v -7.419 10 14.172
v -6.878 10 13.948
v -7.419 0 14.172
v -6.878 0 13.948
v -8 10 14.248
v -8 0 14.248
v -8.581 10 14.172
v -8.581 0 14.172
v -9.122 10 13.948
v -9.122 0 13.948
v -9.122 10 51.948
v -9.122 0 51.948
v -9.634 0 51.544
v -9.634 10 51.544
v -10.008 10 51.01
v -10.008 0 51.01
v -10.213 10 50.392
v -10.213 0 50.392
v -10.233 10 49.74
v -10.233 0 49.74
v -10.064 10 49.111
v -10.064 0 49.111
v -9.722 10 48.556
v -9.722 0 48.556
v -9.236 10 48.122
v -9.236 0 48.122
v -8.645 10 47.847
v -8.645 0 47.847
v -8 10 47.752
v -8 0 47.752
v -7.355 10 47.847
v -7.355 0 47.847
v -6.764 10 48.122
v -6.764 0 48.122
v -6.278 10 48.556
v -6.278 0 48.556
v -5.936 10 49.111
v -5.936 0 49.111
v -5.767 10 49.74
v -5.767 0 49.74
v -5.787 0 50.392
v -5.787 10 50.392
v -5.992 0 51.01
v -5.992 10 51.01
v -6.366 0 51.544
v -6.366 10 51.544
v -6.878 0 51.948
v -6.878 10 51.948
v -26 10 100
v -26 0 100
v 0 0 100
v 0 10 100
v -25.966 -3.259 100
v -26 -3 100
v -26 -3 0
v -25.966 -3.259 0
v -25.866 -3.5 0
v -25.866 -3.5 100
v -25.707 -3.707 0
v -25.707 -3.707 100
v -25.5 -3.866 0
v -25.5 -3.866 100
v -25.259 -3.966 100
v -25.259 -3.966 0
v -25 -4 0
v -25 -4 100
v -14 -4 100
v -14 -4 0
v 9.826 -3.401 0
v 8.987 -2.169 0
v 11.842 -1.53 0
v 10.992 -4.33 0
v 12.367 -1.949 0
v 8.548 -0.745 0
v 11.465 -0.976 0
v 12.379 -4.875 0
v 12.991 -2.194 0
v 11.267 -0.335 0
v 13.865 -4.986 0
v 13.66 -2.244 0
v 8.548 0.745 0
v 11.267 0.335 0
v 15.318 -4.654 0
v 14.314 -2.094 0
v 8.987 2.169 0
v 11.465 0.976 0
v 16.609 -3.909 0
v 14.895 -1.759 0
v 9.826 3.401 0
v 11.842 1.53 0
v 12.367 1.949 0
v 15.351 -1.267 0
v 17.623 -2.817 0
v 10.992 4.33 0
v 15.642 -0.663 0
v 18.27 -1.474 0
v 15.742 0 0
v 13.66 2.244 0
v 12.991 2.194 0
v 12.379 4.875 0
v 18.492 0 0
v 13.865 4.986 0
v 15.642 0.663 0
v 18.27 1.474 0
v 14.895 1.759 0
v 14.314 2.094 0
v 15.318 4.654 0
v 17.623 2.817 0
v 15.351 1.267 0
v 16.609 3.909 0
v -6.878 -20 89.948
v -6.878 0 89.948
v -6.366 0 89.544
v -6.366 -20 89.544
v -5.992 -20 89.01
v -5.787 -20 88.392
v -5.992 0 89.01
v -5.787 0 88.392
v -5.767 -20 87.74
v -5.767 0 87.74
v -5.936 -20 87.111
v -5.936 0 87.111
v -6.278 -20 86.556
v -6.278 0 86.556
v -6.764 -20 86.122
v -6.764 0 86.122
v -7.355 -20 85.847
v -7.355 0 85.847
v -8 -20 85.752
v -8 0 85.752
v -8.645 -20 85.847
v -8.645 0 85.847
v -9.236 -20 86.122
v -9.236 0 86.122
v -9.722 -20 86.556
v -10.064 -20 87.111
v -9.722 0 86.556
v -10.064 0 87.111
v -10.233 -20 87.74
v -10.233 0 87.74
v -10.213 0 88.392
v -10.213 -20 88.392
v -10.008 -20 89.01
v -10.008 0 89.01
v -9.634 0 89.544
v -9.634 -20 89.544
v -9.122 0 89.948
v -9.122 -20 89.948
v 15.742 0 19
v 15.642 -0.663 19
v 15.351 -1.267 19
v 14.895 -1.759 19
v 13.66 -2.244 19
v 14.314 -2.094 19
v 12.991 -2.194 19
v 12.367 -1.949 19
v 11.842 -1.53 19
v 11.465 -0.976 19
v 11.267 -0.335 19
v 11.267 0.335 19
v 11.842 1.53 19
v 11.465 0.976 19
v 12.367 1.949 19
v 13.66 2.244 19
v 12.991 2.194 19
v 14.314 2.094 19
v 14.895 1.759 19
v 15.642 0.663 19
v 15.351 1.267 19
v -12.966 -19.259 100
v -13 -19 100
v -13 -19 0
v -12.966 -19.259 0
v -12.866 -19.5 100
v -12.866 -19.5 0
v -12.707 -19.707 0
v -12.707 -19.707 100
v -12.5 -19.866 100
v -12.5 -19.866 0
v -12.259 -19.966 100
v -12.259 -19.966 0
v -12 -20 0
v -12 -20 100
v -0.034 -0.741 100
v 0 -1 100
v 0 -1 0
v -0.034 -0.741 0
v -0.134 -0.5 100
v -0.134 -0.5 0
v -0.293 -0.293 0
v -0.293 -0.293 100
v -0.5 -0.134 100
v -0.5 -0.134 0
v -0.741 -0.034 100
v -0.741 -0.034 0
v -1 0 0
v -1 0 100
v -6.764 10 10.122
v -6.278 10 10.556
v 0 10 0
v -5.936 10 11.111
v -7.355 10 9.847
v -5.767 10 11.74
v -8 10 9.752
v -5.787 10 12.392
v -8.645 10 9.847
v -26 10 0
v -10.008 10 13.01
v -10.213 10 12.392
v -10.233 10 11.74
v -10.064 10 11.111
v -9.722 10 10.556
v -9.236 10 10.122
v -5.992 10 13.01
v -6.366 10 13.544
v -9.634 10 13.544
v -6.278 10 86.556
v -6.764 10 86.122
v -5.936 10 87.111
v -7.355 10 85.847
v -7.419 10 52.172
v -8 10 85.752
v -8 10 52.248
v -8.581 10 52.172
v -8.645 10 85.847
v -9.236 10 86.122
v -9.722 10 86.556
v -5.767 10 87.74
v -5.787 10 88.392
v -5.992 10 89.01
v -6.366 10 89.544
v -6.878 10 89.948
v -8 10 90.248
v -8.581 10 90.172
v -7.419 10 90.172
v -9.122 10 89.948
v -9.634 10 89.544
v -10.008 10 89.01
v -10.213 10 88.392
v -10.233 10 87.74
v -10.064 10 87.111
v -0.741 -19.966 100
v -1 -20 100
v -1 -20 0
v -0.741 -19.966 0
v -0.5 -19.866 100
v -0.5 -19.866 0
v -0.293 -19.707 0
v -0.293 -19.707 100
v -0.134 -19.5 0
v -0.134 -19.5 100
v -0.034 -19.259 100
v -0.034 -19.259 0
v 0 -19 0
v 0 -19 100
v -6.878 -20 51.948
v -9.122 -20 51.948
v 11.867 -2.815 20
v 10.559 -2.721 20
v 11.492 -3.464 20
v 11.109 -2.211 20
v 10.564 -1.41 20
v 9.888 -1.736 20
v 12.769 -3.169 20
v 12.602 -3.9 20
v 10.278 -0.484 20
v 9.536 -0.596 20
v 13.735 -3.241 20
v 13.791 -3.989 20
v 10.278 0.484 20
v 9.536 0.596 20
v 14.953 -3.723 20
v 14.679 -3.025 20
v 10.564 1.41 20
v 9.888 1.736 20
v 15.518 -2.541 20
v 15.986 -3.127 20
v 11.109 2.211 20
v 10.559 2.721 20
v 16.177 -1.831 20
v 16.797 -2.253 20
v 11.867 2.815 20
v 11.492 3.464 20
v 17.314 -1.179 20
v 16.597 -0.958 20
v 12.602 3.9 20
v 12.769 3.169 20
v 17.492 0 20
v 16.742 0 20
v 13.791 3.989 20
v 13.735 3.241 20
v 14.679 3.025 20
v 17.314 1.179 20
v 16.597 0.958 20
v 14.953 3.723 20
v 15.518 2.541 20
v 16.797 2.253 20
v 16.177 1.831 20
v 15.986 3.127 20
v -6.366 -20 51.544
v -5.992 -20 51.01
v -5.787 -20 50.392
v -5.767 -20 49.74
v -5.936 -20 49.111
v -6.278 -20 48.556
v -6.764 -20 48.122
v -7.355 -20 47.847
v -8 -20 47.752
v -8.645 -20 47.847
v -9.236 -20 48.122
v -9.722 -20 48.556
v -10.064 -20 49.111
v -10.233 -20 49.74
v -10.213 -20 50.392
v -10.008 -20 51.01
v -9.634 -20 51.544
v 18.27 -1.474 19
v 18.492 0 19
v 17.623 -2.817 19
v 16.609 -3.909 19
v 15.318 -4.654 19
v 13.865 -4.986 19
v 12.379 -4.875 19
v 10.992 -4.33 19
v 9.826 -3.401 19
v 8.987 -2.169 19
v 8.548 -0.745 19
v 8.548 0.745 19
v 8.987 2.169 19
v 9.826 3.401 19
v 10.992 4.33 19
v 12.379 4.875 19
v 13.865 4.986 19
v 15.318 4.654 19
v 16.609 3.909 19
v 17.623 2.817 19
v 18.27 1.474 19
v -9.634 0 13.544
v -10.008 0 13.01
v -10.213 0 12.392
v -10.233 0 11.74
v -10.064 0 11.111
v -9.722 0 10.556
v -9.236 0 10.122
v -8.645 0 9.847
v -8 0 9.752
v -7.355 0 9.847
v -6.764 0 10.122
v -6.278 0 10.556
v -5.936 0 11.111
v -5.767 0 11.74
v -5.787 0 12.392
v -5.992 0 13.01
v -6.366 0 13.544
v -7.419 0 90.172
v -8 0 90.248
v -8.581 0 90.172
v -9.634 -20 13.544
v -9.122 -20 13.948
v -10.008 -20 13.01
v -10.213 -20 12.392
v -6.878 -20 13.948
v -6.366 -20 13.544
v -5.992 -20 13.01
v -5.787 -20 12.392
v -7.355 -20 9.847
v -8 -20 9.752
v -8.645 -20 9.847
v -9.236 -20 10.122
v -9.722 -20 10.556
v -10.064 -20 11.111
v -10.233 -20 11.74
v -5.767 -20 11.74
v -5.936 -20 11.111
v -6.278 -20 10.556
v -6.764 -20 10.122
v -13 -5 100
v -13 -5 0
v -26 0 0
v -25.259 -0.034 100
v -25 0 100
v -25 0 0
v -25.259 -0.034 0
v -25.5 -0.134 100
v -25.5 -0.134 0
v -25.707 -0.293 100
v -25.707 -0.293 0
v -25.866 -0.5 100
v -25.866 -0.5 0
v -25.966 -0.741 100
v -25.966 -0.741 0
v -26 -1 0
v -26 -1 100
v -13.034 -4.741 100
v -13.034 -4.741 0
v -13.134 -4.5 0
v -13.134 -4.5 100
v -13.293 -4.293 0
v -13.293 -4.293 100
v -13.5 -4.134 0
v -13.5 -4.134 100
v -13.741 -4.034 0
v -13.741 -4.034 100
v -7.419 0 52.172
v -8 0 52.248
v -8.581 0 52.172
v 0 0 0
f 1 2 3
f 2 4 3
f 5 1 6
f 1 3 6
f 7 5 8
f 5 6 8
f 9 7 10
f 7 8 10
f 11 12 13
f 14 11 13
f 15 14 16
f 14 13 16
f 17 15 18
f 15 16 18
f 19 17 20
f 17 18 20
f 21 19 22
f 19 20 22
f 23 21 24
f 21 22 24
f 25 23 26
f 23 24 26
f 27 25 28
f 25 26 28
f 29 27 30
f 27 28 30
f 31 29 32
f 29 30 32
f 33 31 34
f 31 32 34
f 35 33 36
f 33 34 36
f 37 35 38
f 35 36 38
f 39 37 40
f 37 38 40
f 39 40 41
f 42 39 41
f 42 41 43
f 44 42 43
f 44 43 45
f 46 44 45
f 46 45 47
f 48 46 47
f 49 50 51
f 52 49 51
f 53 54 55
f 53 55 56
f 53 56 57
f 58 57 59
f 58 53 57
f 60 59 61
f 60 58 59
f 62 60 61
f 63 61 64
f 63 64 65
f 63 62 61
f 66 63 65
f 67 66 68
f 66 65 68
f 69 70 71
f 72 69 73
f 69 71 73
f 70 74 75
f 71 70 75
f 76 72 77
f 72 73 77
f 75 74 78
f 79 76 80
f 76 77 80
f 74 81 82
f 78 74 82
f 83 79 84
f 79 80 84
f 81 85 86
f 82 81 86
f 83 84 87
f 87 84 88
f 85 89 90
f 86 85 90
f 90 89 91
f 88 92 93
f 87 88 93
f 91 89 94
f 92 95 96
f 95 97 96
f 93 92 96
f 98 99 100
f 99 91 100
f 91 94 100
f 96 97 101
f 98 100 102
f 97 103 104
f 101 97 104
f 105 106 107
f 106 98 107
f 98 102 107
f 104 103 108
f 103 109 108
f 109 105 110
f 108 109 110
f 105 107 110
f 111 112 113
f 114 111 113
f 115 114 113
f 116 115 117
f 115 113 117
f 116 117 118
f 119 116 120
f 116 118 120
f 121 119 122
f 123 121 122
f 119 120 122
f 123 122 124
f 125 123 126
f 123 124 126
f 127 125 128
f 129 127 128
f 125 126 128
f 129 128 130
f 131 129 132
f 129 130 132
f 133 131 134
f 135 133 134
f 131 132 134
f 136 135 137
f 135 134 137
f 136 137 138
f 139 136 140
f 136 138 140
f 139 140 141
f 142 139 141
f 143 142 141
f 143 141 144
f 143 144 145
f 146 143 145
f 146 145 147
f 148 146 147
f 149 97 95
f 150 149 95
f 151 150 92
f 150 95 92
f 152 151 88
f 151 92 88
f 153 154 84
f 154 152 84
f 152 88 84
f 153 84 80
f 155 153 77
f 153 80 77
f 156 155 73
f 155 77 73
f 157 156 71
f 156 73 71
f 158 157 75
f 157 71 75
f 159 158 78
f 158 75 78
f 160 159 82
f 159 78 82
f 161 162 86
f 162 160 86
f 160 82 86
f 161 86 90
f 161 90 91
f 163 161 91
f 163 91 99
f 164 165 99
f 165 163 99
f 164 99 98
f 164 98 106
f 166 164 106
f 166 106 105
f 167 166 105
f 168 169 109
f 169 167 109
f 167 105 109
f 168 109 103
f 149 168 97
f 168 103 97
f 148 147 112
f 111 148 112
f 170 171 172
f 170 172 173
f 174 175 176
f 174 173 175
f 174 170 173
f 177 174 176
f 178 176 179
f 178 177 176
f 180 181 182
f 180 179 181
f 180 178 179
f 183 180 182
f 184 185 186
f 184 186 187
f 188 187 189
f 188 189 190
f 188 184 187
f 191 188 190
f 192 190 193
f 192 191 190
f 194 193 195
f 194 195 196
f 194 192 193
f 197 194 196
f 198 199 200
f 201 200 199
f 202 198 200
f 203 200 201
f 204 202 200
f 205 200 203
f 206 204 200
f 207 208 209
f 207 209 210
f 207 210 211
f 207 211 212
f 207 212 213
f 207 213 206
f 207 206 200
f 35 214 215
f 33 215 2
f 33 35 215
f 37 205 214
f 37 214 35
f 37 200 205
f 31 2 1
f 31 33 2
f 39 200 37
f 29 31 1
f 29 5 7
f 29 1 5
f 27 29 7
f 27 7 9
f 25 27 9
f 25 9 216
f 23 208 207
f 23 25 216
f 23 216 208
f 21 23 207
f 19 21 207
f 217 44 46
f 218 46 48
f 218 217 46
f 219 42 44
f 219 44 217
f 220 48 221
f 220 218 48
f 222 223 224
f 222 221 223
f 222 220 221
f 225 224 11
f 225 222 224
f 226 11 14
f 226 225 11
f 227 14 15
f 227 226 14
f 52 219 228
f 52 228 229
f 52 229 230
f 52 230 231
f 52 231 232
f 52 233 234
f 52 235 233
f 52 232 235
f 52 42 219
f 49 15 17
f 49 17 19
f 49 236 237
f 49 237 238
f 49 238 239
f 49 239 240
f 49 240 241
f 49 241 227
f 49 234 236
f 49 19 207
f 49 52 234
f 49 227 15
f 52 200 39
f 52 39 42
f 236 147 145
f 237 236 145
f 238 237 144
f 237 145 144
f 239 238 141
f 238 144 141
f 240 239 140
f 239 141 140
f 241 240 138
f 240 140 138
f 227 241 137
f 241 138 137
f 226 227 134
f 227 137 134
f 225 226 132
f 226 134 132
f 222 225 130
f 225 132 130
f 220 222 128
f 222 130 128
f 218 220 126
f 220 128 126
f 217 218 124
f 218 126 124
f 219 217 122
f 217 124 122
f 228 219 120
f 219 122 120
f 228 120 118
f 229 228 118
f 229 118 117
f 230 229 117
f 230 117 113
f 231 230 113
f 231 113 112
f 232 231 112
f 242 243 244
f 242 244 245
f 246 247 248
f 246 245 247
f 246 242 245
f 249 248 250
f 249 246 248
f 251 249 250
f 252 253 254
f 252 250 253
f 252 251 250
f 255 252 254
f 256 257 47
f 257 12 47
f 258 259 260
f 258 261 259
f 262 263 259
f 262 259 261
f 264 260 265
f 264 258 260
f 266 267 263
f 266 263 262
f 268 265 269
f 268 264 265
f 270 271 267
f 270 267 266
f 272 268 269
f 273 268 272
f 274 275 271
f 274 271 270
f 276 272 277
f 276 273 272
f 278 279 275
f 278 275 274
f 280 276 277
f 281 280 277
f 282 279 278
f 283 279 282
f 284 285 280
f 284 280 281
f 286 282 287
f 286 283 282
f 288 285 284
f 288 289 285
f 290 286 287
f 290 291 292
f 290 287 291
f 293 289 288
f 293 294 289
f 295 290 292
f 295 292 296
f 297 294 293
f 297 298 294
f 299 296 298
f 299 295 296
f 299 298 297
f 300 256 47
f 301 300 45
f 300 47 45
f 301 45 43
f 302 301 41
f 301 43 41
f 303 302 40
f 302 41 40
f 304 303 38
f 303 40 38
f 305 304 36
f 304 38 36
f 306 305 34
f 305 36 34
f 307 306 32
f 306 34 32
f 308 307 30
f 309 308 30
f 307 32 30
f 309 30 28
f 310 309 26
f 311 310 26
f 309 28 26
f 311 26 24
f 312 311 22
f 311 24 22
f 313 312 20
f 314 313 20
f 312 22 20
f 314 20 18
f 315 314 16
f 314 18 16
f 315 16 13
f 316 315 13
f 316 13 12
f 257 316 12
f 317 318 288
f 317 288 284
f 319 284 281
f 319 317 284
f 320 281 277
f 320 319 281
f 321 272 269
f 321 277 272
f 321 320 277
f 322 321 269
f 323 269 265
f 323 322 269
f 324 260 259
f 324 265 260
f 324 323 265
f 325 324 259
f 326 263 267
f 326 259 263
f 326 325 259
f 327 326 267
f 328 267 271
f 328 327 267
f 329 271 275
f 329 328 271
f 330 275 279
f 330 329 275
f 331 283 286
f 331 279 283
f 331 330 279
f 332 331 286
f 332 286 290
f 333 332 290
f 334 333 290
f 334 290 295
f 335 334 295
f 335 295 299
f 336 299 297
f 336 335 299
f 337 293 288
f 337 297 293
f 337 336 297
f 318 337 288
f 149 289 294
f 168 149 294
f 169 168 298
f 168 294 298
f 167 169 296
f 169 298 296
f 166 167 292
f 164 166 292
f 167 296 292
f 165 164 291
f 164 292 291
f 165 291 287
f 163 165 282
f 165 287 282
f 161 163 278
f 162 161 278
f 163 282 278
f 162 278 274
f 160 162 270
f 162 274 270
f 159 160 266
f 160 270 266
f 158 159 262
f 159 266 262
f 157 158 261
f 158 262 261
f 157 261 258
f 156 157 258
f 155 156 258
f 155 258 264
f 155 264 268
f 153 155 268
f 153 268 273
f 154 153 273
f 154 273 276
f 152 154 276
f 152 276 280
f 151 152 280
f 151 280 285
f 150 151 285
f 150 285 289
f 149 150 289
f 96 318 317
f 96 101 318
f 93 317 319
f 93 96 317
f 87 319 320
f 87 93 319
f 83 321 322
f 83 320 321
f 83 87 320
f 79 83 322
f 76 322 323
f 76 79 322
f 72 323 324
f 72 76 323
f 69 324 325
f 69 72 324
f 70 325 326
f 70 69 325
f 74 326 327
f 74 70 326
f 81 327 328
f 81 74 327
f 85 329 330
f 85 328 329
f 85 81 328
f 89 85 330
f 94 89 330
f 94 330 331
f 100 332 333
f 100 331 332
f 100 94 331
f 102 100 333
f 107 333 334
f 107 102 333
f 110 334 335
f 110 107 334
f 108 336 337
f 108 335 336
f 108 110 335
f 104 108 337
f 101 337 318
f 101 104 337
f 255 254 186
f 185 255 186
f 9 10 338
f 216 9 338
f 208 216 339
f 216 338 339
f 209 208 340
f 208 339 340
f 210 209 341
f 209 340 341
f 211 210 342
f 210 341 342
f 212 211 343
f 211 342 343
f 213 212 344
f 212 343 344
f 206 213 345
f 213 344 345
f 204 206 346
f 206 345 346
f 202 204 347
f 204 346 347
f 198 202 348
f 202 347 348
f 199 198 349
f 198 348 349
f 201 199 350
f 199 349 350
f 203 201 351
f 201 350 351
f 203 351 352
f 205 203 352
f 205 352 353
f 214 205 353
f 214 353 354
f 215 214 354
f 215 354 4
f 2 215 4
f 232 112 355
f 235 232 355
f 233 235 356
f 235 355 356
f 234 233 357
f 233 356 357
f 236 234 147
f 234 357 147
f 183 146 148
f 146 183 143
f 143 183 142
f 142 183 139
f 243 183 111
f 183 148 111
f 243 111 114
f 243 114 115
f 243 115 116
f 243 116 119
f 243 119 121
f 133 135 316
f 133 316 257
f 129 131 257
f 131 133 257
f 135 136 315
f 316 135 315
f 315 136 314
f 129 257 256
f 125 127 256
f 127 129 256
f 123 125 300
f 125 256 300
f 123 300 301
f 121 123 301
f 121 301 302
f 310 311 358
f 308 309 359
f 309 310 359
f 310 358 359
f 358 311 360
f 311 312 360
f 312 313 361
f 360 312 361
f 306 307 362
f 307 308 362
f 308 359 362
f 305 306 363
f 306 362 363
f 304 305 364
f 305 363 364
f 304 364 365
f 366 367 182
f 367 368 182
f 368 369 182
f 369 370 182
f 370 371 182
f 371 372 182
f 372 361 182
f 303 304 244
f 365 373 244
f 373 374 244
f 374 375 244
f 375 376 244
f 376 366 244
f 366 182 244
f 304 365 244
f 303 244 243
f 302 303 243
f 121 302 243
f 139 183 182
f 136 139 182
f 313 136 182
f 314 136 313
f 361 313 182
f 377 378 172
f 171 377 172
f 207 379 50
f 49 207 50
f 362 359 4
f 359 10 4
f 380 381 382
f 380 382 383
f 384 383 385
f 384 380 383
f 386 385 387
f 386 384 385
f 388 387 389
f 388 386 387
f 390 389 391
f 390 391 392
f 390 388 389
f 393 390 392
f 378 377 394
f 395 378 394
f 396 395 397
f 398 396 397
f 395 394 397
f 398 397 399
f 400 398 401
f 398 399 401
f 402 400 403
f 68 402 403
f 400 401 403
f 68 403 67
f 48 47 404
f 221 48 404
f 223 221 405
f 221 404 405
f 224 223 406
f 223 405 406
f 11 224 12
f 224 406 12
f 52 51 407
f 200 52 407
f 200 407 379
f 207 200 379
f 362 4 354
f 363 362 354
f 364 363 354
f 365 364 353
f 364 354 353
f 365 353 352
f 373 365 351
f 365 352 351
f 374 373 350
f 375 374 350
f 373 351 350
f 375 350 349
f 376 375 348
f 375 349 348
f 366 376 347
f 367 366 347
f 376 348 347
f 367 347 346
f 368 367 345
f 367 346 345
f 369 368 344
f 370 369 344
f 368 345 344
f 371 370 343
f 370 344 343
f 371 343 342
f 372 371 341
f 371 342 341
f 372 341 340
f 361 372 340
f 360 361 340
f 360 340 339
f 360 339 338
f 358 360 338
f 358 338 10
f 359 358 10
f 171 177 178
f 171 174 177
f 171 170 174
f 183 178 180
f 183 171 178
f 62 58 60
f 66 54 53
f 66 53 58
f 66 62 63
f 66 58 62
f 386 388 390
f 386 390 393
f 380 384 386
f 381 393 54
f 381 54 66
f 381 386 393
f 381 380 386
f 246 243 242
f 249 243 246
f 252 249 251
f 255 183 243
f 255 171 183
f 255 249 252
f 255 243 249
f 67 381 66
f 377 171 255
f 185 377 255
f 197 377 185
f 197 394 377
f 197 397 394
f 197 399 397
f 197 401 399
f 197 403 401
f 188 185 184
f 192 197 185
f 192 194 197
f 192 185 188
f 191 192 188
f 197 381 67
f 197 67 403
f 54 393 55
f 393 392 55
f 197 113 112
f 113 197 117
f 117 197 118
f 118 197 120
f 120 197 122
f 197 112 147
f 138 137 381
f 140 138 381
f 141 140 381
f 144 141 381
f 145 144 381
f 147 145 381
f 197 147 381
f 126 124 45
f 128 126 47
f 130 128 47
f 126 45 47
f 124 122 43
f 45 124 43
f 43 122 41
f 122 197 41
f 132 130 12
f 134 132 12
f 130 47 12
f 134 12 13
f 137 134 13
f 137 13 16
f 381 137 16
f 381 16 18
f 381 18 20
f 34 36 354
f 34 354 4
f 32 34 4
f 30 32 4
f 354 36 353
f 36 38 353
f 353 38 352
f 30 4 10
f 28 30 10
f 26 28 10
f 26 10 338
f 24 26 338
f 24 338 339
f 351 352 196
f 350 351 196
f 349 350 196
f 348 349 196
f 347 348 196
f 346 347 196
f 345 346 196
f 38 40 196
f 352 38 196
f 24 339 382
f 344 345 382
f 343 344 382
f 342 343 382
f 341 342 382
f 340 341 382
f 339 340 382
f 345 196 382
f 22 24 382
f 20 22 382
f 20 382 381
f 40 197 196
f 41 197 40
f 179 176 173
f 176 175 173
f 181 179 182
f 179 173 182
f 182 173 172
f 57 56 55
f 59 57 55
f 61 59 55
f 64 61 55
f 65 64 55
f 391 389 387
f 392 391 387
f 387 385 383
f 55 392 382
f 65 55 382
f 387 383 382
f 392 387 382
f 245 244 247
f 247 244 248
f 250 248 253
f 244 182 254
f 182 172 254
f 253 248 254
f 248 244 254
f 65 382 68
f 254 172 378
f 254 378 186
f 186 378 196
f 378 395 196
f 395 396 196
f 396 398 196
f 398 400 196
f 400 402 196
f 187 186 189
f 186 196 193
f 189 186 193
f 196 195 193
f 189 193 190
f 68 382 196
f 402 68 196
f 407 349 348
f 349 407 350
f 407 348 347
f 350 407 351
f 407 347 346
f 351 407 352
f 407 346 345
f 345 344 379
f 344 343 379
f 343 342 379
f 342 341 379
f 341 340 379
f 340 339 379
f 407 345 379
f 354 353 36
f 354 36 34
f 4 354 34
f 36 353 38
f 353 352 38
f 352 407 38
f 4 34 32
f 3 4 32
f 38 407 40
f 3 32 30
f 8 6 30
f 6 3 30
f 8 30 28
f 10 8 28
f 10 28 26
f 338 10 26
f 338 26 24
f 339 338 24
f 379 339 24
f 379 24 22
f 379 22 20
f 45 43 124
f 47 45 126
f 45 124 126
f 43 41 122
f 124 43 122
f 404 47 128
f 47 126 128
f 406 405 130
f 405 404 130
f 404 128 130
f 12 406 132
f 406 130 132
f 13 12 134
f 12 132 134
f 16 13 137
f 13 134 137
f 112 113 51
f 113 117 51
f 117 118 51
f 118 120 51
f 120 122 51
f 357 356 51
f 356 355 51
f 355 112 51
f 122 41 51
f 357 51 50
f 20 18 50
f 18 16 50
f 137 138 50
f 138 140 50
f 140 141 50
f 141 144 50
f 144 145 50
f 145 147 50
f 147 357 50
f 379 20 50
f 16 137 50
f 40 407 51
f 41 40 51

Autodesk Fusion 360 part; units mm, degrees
sketch "Sketch1" plane through (0, 0, 0) normal (0, 0, 1) x (1, 0, 0)
  line L0 (0, 0) -> (-26, 0)
  line L1 (-26, 0) -> (-26, -4)
  line L2 (-26, -4) -> (-13, -4)
  line L3 (-13, -4) -> (-13, -20)
  line L4 (-13, -20) -> (0, -20)
  line L5 (0, -20) -> (0, 0)
  dimension "d1" = 4
  dimension "d2" = 13
  dimension "d3" = 13
  dimension "d4" = 16
extrude "Extrude1" add sketch "Sketch1" along normal blind 100 makes body 1
sketch "Sketch2" plane through (0, 0, 0) normal (0, 1, 0) x (-1, 0, 0)
  line L0 (0, 0) -> (26, 0)
  line L1 (26, 0) -> (26, 100)
  line L2 (26, 100) -> (0, 100)
  line L3 (0, 100) -> (0, 0)
  line L4 (0, 0) -> (0, 100)
  line L5 (13, 0) -> (13, 100)
  line L6 (13, 100) -> (0, 100)
  line L7 (13, 0) -> (0, 0)
  line L8 (8, 100) -> (8, 0) construction
  line L9 (8, 14.2479) -> (8, 13.9479) construction
  line L10 (9.1219, 13.9479) -> (6.8781, 13.9479)
  arc A0 (6.8781, 13.9479) -> (9.1219, 13.9479) centre (8, 12) ccw
  arc A1 (9.1219, 13.9479) -> (8, 14.2479) centre (8, 12) ccw construction
  arc A2 (8, 14.2479) -> (6.8781, 13.9479) centre (8, 12) ccw construction
  dimension "d8" = 0.3
  dimension "d10" = 12
  dimension "d11" = 4.4958
  dimension "d20" = 5
extrude "Extrude2" cut sketch "Sketch2" against normal through all contours L10 A0 bodies 1
pattern_linear "R-Pattern1" count 3 spacing 38 along (0, 0, 1) of "Extrude2"
fillet "Fillet1" radius 1 6 edges at (0, 0, 50) (-26, 0, 50) (-26, -4, 50) (-13, -4, 50) (-13, -20, 50) (0, -20, 50) on bodies 1
copy_body "Body->Comp1" bodies 1 removing the originals makes body 2 in component "IKEA Trofast Bin to drawer bracket"
sketch "Sketch1 (2)" plane through (0, 0, 0) normal (0, 0, 1) x (1, 0, 0) in component "Bumper"
  circle A0 centre (13.4917, 0) radius 5
  circle A1 centre (13.4917, 0) radius 2.25
  dimension "d21" = 4.5
  dimension "d22" = 10
extrude "Extrude1'" add sketch "Sketch1 (2)" along normal blind 20 separate body makes body 3 in component "Bumper"
chamfer "Chamfer1" distance 1 angle 45 2 edges at (8.8301, -1.8081, 20) (11.394, 0.8136, 20) on bodies 3 in component "Bumper"
sketch "Sketch1 (3)" plane through (0, 0, 0) normal (0, 1, 0) x (-1, 0, 0) in component "10mm tall spacer"
  line L0 (25, 0) -> (25, 100)
  line L1 (25, 100) -> (1, 100)
  line L2 (1, 100) -> (1, 0)
  line L3 (1, 0) -> (25, 0)
  arc A0 (6.8781, 89.9479) -> (9.1219, 89.9479) centre (8, 88) ccw
  line L4 (6.8781, 89.9479) -> (9.1219, 89.9479)
  arc A1 (6.8781, 51.9479) -> (9.1219, 51.9479) centre (8, 50) ccw
  line L5 (6.8781, 51.9479) -> (9.1219, 51.9479)
  arc A2 (6.8781, 13.9479) -> (9.1219, 13.9479) centre (8, 12) ccw
  line L6 (6.8781, 13.9479) -> (9.1219, 13.9479)
  arc A3 (6.8781, 13.9479) -> (9.1219, 13.9479) centre (8, 12) ccw
  arc A4 (6.8781, 89.9479) -> (9.1219, 89.9479) centre (8, 88) ccw
  arc A5 (6.8781, 51.9479) -> (9.1219, 51.9479) centre (8, 50) ccw
  line L7 (0, 100) -> (0, 0)
  line L8 (26, 0) -> (26, 100)
  line L9 (26, 0) -> (0, 0)
  line L10 (0, 0) -> (0, 100)
  line L11 (0, 100) -> (26, 100)
  line L12 (26, 100) -> (26, 0)
  circle A6 centre (8, 12) radius 2.2479
  circle A7 centre (8, 50) radius 2.2479
  circle A8 centre (8, 88) radius 2.2479
  point P0 (26, 0)
  point P1 (0, 100)
  point P2 (26, 100)
extrude "Extrude1''" add sketch "Sketch1 (3)" along normal blind 10 separate body makes body 4 in component "10mm tall spacer"
component "IKEA Trofast Bin to drawer bracket" placed x (1, 0, 0) y (0, 1, 0) z (0, 0, 1) at (0, 0, 0)
component "Bumper" placed x (1, 0, 0) y (0, 1, 0) z (0, 0, 1) at (0, 0, 0)
component "10mm tall spacer" placed x (1, 0, 0) y (0, 1, 0) z (0, 0, 1) at (0, 0, 0)
